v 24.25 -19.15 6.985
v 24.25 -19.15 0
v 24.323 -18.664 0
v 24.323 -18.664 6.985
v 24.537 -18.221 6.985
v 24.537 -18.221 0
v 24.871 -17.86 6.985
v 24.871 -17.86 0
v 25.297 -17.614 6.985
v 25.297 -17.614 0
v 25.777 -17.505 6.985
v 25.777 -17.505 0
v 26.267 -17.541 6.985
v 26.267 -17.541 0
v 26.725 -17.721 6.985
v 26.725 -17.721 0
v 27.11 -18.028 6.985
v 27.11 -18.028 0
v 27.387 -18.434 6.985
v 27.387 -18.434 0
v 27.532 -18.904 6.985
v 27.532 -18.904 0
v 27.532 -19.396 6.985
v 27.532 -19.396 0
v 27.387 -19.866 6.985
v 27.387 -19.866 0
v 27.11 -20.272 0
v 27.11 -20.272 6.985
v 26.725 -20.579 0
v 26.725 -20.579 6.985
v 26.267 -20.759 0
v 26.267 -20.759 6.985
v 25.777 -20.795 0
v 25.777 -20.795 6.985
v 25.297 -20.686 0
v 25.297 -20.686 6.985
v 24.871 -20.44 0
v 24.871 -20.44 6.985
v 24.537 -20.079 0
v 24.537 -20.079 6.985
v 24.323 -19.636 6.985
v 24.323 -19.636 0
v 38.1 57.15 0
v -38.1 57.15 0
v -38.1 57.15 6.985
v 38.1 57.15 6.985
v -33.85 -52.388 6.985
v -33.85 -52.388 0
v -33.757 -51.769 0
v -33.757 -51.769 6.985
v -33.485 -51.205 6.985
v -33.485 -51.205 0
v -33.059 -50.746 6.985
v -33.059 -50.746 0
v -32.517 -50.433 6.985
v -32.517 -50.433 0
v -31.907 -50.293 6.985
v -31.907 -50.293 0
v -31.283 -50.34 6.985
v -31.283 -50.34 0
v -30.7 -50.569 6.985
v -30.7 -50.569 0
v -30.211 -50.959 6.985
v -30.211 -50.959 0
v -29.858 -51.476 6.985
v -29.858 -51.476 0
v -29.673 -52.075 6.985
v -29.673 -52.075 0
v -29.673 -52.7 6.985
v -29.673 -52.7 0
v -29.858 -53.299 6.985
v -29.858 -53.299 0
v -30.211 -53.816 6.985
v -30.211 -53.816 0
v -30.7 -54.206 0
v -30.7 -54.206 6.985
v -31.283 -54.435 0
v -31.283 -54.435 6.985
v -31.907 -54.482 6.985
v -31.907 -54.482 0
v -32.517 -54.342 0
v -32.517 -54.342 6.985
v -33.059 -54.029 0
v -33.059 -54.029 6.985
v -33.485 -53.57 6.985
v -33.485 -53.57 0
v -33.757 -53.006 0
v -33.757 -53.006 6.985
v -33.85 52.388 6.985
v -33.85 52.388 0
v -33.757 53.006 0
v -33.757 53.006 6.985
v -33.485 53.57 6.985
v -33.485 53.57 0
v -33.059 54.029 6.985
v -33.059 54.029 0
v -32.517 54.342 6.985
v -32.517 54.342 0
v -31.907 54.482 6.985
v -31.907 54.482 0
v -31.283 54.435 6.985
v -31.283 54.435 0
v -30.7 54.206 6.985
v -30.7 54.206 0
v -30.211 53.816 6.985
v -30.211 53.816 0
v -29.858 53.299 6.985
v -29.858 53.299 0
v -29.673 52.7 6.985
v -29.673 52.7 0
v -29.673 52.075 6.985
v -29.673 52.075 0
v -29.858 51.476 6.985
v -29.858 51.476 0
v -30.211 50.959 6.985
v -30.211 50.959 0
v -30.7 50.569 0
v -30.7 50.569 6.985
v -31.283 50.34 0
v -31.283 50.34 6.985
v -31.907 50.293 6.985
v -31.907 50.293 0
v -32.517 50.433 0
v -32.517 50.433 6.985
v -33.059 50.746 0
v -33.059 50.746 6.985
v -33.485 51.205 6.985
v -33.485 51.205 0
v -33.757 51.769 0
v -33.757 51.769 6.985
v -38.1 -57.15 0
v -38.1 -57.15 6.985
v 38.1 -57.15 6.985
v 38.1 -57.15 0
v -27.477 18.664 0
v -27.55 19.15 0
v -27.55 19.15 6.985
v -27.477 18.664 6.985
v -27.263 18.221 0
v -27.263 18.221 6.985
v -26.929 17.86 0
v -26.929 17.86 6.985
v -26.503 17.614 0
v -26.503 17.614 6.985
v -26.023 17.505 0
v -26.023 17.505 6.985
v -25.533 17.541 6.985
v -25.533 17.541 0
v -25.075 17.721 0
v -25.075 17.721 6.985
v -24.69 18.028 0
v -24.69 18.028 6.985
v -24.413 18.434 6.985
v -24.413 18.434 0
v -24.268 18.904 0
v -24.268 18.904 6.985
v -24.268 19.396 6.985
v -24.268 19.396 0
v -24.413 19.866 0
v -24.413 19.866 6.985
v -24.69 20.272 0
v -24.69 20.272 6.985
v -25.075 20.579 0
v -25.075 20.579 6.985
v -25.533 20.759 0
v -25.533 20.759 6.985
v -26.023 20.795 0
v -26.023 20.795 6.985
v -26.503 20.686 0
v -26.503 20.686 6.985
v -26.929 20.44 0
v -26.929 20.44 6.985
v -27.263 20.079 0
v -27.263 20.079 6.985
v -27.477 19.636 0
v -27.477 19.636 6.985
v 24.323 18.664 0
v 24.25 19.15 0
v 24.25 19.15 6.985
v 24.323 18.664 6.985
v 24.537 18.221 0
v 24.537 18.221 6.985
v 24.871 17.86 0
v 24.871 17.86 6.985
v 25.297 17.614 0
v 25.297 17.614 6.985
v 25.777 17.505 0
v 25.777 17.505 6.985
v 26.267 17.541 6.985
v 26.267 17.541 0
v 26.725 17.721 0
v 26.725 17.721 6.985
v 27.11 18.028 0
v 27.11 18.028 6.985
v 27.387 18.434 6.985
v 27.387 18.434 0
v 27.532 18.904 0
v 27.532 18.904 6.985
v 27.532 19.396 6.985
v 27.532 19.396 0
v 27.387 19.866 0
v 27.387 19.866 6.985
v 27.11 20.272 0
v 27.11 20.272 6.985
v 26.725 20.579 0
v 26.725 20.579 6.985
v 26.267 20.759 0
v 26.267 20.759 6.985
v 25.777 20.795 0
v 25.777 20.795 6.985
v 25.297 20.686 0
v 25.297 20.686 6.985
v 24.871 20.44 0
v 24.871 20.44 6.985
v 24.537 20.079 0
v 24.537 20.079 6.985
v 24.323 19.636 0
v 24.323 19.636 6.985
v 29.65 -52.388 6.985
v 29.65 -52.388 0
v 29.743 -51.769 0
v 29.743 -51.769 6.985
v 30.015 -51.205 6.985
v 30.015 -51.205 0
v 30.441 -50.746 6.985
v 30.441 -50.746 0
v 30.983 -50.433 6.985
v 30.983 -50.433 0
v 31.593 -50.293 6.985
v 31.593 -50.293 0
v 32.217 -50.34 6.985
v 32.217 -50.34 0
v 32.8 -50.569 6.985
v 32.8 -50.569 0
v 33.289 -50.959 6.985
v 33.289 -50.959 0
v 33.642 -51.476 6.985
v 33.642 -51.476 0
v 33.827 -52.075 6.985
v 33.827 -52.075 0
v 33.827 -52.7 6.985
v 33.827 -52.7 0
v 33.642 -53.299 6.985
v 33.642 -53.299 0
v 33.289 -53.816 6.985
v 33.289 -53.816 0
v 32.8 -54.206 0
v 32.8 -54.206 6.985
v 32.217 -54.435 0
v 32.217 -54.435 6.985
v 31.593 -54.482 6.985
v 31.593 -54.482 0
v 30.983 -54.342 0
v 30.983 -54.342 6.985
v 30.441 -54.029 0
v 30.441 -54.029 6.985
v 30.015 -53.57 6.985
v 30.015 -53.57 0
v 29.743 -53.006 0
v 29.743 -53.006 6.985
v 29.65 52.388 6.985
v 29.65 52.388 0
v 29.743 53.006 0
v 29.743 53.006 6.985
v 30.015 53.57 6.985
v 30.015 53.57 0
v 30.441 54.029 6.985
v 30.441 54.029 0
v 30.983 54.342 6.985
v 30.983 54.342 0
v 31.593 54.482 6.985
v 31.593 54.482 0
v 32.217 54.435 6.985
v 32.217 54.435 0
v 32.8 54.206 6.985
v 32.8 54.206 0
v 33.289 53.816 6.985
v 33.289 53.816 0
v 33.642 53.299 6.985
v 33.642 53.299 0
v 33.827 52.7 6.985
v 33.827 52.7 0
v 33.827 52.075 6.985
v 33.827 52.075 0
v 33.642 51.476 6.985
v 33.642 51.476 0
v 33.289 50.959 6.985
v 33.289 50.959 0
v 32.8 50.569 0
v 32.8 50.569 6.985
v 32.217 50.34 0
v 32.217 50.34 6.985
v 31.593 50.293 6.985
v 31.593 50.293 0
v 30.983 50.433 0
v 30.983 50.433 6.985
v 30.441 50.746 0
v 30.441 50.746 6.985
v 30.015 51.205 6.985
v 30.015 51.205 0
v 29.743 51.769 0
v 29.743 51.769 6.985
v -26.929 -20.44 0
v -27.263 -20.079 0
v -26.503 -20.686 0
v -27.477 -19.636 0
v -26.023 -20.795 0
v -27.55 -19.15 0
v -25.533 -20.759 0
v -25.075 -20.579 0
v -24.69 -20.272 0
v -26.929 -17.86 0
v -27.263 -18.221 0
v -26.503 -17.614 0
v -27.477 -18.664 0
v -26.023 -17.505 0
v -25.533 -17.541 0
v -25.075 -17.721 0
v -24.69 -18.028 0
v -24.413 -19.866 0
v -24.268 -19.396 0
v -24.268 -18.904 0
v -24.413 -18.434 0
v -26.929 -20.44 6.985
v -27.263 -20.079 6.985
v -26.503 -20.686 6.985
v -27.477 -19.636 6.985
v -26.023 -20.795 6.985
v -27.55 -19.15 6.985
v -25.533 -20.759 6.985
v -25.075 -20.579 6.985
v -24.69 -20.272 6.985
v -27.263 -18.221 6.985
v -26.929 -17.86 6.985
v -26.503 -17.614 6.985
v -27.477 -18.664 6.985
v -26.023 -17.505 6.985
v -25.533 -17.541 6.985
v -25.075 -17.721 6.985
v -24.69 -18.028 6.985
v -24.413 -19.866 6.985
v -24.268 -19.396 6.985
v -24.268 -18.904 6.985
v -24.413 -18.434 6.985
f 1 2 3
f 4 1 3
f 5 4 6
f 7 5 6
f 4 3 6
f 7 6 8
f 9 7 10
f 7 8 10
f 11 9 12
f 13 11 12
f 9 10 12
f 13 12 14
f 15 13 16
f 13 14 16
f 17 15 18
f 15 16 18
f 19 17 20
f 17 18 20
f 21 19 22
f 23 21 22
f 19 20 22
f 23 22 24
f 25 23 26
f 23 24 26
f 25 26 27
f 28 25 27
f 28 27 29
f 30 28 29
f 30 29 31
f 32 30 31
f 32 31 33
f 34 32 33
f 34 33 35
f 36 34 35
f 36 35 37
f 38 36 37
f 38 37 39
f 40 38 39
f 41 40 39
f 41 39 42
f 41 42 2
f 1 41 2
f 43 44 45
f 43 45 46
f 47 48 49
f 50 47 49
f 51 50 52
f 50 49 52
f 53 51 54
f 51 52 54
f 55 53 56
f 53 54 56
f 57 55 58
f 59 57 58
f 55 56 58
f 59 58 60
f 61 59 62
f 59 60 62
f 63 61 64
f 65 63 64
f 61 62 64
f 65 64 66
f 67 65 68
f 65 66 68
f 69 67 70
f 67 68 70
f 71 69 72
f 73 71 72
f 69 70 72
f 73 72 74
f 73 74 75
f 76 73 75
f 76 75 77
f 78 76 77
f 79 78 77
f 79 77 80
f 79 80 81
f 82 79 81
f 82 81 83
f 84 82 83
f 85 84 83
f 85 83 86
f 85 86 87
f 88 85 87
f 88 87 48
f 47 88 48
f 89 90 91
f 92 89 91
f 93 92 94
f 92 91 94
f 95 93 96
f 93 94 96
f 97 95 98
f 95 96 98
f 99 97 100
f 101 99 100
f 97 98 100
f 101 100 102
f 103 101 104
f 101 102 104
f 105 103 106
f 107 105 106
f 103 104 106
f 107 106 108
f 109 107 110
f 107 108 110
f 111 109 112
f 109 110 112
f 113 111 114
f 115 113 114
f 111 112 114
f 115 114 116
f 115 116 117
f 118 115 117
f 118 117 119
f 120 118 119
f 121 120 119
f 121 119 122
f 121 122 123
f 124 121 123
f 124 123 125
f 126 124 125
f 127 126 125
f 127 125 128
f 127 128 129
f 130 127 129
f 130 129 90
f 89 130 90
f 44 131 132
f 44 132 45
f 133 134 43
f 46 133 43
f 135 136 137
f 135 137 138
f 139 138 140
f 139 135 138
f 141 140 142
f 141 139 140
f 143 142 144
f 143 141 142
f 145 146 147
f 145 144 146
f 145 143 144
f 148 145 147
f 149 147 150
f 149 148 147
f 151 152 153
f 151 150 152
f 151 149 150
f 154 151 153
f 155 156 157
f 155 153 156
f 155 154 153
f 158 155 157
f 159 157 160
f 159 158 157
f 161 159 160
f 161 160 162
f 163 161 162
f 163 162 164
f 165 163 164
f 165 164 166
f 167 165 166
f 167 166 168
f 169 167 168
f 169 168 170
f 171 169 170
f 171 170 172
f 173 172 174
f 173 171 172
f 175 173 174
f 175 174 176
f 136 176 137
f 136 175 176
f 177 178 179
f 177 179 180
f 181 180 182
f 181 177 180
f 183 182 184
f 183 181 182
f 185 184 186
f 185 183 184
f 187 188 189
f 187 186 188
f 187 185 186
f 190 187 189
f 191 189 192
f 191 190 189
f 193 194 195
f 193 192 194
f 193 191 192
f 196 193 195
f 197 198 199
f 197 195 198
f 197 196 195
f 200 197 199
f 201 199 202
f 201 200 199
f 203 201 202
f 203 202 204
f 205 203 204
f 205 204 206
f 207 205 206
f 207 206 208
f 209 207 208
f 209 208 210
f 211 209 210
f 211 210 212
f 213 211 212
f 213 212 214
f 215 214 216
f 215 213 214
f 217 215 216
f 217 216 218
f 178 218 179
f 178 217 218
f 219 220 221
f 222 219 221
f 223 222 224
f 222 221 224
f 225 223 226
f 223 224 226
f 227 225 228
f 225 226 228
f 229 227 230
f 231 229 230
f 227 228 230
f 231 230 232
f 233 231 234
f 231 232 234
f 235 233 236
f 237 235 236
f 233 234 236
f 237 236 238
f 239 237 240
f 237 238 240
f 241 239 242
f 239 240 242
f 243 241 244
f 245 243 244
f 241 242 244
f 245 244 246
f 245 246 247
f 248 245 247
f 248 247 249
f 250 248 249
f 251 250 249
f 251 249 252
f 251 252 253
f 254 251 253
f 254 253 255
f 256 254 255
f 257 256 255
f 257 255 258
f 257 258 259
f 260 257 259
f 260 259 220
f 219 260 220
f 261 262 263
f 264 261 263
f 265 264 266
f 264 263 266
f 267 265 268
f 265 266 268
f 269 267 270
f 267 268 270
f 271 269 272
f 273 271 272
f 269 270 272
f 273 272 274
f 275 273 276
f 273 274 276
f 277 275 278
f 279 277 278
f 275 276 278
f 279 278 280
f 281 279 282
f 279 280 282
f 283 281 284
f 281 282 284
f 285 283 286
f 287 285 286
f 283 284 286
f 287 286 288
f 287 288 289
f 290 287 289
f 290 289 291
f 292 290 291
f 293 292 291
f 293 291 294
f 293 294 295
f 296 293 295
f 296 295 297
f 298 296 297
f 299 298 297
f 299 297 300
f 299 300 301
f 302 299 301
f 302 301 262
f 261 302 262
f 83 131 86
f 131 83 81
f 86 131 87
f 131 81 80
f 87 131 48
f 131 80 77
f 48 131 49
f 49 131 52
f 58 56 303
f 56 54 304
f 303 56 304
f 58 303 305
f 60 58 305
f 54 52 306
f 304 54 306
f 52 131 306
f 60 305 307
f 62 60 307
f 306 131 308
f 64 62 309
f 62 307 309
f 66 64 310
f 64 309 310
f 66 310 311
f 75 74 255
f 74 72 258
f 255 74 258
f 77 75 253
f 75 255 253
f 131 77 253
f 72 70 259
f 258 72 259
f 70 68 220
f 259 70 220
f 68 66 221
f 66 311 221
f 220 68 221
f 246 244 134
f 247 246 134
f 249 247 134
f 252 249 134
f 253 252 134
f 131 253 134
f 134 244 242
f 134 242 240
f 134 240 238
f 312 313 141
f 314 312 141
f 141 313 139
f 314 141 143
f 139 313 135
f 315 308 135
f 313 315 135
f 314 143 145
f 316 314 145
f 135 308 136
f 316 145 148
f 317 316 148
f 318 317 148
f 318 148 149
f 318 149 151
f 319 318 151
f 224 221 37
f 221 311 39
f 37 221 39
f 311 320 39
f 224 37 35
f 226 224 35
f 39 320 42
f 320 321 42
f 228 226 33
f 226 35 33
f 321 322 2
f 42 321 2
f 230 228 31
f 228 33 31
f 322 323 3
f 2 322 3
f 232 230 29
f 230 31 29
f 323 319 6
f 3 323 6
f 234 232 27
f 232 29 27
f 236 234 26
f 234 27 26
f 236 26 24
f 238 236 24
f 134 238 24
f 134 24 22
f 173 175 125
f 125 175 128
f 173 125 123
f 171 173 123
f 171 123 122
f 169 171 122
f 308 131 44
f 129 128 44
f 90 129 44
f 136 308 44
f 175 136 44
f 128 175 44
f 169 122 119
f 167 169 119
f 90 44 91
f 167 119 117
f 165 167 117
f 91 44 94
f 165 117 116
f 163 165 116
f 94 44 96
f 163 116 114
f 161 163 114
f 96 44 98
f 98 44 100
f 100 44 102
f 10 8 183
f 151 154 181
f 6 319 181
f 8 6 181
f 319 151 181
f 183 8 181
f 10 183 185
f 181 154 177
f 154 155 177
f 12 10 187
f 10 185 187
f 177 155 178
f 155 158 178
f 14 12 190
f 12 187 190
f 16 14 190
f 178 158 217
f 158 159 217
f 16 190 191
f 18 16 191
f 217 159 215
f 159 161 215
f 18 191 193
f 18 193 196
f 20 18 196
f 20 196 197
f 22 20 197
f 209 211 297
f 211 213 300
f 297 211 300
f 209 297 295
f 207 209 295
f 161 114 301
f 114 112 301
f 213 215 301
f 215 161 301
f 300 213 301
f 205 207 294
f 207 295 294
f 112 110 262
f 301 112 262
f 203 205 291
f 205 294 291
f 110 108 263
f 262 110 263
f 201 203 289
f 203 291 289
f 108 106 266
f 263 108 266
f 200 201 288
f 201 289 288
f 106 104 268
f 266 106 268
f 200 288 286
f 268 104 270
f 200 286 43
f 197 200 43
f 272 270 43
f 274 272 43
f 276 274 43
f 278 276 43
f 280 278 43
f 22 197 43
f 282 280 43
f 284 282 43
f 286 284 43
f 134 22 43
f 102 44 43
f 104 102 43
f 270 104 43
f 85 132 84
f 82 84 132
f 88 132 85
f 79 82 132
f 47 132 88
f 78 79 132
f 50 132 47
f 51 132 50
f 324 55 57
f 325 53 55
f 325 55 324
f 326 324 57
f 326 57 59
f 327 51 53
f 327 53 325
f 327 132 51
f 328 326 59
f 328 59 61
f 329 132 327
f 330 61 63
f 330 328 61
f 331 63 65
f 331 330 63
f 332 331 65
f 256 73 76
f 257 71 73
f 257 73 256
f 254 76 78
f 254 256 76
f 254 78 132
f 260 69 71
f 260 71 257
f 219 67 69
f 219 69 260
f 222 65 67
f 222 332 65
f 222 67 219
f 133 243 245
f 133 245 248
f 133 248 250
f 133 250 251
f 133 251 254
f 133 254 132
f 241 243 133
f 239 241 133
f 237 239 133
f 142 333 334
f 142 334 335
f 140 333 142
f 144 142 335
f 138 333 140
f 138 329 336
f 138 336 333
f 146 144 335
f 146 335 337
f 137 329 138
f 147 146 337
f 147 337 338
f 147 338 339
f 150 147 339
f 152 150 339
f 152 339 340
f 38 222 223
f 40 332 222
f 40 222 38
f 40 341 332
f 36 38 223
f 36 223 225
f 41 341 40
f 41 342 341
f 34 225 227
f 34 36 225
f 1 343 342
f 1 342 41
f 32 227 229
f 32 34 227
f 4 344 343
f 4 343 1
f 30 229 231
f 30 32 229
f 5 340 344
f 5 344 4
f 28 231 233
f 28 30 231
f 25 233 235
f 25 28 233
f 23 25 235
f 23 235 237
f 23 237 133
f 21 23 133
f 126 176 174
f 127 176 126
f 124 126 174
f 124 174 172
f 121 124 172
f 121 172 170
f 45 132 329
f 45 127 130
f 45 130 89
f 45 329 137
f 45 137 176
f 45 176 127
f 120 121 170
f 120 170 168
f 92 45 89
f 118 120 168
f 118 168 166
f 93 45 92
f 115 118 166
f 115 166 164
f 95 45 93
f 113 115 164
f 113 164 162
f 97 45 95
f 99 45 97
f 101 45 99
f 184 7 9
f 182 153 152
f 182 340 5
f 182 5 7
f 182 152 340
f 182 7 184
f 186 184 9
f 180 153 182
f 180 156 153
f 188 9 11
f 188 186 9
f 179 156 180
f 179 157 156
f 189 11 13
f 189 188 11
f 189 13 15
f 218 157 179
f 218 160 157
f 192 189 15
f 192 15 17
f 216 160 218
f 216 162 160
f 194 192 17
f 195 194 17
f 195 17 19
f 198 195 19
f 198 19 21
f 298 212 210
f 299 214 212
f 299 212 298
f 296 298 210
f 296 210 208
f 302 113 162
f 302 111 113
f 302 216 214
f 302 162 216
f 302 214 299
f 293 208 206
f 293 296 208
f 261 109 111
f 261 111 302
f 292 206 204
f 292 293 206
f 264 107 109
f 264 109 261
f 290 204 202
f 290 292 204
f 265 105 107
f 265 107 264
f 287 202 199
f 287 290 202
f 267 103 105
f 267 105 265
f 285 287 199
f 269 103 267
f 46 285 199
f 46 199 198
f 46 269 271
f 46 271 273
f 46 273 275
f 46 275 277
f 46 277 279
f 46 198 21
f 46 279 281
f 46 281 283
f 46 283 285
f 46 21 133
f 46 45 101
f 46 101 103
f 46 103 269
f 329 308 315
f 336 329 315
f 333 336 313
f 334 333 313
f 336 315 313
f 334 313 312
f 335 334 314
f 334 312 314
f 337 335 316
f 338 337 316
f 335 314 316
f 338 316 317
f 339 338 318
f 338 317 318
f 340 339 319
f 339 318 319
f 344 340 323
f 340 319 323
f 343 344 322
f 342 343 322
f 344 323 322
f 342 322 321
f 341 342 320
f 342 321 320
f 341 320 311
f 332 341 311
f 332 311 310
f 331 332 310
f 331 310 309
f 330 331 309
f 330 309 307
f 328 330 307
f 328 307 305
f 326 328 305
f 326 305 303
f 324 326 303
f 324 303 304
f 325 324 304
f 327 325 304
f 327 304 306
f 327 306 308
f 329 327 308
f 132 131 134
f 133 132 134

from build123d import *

# Parameters (mm, degrees)
F0_W     = 76.2
F0_H     = 114.3
F1_DEPTH = 6.985
F3_D     = 4.2
F6_D     = 3.3
F6_DEPTH = 12
F6_TIP   = 0.9914200214


# Not quite as in the source:
# - a pattern or mirror of a feature is missing from the dataset's text; its kind, count and spacing are read off the source's solid
# - a feature names something its author has since deleted; it is built from what else it names


with BuildPart() as f1:
    # F0 (on Top) → F1 (new body)
    with BuildSketch(Plane.XY):
        Rectangle(F0_W, F0_H)
    extrude(amount=F1_DEPTH)

    # F3 (through all)
    with Locations(Plane.XY.offset(6.985)):
        with Locations((-31.75, 52.3875), (31.75, 52.3875), (31.75, -52.3875), (-31.75, -52.3875)):
            Hole(F3_D / 2)

    # F6
    with Locations(Plane.XY.offset(6.985)):
        with Locations((-25.9, -19.15), (25.9, -19.15)):
            f6 = Hole(F6_D / 2, depth=F6_DEPTH)
            with Locations((0, 0, -(F6_DEPTH + F6_TIP / 2))):  # 118° drill point
                Cone(0, F6_D / 2, F6_TIP, mode=Mode.SUBTRACT)

    # F6_copies: F6 across plane
    add(f6.mirror(Plane.ZX), mode=Mode.SUBTRACT)


solid = f1.part
